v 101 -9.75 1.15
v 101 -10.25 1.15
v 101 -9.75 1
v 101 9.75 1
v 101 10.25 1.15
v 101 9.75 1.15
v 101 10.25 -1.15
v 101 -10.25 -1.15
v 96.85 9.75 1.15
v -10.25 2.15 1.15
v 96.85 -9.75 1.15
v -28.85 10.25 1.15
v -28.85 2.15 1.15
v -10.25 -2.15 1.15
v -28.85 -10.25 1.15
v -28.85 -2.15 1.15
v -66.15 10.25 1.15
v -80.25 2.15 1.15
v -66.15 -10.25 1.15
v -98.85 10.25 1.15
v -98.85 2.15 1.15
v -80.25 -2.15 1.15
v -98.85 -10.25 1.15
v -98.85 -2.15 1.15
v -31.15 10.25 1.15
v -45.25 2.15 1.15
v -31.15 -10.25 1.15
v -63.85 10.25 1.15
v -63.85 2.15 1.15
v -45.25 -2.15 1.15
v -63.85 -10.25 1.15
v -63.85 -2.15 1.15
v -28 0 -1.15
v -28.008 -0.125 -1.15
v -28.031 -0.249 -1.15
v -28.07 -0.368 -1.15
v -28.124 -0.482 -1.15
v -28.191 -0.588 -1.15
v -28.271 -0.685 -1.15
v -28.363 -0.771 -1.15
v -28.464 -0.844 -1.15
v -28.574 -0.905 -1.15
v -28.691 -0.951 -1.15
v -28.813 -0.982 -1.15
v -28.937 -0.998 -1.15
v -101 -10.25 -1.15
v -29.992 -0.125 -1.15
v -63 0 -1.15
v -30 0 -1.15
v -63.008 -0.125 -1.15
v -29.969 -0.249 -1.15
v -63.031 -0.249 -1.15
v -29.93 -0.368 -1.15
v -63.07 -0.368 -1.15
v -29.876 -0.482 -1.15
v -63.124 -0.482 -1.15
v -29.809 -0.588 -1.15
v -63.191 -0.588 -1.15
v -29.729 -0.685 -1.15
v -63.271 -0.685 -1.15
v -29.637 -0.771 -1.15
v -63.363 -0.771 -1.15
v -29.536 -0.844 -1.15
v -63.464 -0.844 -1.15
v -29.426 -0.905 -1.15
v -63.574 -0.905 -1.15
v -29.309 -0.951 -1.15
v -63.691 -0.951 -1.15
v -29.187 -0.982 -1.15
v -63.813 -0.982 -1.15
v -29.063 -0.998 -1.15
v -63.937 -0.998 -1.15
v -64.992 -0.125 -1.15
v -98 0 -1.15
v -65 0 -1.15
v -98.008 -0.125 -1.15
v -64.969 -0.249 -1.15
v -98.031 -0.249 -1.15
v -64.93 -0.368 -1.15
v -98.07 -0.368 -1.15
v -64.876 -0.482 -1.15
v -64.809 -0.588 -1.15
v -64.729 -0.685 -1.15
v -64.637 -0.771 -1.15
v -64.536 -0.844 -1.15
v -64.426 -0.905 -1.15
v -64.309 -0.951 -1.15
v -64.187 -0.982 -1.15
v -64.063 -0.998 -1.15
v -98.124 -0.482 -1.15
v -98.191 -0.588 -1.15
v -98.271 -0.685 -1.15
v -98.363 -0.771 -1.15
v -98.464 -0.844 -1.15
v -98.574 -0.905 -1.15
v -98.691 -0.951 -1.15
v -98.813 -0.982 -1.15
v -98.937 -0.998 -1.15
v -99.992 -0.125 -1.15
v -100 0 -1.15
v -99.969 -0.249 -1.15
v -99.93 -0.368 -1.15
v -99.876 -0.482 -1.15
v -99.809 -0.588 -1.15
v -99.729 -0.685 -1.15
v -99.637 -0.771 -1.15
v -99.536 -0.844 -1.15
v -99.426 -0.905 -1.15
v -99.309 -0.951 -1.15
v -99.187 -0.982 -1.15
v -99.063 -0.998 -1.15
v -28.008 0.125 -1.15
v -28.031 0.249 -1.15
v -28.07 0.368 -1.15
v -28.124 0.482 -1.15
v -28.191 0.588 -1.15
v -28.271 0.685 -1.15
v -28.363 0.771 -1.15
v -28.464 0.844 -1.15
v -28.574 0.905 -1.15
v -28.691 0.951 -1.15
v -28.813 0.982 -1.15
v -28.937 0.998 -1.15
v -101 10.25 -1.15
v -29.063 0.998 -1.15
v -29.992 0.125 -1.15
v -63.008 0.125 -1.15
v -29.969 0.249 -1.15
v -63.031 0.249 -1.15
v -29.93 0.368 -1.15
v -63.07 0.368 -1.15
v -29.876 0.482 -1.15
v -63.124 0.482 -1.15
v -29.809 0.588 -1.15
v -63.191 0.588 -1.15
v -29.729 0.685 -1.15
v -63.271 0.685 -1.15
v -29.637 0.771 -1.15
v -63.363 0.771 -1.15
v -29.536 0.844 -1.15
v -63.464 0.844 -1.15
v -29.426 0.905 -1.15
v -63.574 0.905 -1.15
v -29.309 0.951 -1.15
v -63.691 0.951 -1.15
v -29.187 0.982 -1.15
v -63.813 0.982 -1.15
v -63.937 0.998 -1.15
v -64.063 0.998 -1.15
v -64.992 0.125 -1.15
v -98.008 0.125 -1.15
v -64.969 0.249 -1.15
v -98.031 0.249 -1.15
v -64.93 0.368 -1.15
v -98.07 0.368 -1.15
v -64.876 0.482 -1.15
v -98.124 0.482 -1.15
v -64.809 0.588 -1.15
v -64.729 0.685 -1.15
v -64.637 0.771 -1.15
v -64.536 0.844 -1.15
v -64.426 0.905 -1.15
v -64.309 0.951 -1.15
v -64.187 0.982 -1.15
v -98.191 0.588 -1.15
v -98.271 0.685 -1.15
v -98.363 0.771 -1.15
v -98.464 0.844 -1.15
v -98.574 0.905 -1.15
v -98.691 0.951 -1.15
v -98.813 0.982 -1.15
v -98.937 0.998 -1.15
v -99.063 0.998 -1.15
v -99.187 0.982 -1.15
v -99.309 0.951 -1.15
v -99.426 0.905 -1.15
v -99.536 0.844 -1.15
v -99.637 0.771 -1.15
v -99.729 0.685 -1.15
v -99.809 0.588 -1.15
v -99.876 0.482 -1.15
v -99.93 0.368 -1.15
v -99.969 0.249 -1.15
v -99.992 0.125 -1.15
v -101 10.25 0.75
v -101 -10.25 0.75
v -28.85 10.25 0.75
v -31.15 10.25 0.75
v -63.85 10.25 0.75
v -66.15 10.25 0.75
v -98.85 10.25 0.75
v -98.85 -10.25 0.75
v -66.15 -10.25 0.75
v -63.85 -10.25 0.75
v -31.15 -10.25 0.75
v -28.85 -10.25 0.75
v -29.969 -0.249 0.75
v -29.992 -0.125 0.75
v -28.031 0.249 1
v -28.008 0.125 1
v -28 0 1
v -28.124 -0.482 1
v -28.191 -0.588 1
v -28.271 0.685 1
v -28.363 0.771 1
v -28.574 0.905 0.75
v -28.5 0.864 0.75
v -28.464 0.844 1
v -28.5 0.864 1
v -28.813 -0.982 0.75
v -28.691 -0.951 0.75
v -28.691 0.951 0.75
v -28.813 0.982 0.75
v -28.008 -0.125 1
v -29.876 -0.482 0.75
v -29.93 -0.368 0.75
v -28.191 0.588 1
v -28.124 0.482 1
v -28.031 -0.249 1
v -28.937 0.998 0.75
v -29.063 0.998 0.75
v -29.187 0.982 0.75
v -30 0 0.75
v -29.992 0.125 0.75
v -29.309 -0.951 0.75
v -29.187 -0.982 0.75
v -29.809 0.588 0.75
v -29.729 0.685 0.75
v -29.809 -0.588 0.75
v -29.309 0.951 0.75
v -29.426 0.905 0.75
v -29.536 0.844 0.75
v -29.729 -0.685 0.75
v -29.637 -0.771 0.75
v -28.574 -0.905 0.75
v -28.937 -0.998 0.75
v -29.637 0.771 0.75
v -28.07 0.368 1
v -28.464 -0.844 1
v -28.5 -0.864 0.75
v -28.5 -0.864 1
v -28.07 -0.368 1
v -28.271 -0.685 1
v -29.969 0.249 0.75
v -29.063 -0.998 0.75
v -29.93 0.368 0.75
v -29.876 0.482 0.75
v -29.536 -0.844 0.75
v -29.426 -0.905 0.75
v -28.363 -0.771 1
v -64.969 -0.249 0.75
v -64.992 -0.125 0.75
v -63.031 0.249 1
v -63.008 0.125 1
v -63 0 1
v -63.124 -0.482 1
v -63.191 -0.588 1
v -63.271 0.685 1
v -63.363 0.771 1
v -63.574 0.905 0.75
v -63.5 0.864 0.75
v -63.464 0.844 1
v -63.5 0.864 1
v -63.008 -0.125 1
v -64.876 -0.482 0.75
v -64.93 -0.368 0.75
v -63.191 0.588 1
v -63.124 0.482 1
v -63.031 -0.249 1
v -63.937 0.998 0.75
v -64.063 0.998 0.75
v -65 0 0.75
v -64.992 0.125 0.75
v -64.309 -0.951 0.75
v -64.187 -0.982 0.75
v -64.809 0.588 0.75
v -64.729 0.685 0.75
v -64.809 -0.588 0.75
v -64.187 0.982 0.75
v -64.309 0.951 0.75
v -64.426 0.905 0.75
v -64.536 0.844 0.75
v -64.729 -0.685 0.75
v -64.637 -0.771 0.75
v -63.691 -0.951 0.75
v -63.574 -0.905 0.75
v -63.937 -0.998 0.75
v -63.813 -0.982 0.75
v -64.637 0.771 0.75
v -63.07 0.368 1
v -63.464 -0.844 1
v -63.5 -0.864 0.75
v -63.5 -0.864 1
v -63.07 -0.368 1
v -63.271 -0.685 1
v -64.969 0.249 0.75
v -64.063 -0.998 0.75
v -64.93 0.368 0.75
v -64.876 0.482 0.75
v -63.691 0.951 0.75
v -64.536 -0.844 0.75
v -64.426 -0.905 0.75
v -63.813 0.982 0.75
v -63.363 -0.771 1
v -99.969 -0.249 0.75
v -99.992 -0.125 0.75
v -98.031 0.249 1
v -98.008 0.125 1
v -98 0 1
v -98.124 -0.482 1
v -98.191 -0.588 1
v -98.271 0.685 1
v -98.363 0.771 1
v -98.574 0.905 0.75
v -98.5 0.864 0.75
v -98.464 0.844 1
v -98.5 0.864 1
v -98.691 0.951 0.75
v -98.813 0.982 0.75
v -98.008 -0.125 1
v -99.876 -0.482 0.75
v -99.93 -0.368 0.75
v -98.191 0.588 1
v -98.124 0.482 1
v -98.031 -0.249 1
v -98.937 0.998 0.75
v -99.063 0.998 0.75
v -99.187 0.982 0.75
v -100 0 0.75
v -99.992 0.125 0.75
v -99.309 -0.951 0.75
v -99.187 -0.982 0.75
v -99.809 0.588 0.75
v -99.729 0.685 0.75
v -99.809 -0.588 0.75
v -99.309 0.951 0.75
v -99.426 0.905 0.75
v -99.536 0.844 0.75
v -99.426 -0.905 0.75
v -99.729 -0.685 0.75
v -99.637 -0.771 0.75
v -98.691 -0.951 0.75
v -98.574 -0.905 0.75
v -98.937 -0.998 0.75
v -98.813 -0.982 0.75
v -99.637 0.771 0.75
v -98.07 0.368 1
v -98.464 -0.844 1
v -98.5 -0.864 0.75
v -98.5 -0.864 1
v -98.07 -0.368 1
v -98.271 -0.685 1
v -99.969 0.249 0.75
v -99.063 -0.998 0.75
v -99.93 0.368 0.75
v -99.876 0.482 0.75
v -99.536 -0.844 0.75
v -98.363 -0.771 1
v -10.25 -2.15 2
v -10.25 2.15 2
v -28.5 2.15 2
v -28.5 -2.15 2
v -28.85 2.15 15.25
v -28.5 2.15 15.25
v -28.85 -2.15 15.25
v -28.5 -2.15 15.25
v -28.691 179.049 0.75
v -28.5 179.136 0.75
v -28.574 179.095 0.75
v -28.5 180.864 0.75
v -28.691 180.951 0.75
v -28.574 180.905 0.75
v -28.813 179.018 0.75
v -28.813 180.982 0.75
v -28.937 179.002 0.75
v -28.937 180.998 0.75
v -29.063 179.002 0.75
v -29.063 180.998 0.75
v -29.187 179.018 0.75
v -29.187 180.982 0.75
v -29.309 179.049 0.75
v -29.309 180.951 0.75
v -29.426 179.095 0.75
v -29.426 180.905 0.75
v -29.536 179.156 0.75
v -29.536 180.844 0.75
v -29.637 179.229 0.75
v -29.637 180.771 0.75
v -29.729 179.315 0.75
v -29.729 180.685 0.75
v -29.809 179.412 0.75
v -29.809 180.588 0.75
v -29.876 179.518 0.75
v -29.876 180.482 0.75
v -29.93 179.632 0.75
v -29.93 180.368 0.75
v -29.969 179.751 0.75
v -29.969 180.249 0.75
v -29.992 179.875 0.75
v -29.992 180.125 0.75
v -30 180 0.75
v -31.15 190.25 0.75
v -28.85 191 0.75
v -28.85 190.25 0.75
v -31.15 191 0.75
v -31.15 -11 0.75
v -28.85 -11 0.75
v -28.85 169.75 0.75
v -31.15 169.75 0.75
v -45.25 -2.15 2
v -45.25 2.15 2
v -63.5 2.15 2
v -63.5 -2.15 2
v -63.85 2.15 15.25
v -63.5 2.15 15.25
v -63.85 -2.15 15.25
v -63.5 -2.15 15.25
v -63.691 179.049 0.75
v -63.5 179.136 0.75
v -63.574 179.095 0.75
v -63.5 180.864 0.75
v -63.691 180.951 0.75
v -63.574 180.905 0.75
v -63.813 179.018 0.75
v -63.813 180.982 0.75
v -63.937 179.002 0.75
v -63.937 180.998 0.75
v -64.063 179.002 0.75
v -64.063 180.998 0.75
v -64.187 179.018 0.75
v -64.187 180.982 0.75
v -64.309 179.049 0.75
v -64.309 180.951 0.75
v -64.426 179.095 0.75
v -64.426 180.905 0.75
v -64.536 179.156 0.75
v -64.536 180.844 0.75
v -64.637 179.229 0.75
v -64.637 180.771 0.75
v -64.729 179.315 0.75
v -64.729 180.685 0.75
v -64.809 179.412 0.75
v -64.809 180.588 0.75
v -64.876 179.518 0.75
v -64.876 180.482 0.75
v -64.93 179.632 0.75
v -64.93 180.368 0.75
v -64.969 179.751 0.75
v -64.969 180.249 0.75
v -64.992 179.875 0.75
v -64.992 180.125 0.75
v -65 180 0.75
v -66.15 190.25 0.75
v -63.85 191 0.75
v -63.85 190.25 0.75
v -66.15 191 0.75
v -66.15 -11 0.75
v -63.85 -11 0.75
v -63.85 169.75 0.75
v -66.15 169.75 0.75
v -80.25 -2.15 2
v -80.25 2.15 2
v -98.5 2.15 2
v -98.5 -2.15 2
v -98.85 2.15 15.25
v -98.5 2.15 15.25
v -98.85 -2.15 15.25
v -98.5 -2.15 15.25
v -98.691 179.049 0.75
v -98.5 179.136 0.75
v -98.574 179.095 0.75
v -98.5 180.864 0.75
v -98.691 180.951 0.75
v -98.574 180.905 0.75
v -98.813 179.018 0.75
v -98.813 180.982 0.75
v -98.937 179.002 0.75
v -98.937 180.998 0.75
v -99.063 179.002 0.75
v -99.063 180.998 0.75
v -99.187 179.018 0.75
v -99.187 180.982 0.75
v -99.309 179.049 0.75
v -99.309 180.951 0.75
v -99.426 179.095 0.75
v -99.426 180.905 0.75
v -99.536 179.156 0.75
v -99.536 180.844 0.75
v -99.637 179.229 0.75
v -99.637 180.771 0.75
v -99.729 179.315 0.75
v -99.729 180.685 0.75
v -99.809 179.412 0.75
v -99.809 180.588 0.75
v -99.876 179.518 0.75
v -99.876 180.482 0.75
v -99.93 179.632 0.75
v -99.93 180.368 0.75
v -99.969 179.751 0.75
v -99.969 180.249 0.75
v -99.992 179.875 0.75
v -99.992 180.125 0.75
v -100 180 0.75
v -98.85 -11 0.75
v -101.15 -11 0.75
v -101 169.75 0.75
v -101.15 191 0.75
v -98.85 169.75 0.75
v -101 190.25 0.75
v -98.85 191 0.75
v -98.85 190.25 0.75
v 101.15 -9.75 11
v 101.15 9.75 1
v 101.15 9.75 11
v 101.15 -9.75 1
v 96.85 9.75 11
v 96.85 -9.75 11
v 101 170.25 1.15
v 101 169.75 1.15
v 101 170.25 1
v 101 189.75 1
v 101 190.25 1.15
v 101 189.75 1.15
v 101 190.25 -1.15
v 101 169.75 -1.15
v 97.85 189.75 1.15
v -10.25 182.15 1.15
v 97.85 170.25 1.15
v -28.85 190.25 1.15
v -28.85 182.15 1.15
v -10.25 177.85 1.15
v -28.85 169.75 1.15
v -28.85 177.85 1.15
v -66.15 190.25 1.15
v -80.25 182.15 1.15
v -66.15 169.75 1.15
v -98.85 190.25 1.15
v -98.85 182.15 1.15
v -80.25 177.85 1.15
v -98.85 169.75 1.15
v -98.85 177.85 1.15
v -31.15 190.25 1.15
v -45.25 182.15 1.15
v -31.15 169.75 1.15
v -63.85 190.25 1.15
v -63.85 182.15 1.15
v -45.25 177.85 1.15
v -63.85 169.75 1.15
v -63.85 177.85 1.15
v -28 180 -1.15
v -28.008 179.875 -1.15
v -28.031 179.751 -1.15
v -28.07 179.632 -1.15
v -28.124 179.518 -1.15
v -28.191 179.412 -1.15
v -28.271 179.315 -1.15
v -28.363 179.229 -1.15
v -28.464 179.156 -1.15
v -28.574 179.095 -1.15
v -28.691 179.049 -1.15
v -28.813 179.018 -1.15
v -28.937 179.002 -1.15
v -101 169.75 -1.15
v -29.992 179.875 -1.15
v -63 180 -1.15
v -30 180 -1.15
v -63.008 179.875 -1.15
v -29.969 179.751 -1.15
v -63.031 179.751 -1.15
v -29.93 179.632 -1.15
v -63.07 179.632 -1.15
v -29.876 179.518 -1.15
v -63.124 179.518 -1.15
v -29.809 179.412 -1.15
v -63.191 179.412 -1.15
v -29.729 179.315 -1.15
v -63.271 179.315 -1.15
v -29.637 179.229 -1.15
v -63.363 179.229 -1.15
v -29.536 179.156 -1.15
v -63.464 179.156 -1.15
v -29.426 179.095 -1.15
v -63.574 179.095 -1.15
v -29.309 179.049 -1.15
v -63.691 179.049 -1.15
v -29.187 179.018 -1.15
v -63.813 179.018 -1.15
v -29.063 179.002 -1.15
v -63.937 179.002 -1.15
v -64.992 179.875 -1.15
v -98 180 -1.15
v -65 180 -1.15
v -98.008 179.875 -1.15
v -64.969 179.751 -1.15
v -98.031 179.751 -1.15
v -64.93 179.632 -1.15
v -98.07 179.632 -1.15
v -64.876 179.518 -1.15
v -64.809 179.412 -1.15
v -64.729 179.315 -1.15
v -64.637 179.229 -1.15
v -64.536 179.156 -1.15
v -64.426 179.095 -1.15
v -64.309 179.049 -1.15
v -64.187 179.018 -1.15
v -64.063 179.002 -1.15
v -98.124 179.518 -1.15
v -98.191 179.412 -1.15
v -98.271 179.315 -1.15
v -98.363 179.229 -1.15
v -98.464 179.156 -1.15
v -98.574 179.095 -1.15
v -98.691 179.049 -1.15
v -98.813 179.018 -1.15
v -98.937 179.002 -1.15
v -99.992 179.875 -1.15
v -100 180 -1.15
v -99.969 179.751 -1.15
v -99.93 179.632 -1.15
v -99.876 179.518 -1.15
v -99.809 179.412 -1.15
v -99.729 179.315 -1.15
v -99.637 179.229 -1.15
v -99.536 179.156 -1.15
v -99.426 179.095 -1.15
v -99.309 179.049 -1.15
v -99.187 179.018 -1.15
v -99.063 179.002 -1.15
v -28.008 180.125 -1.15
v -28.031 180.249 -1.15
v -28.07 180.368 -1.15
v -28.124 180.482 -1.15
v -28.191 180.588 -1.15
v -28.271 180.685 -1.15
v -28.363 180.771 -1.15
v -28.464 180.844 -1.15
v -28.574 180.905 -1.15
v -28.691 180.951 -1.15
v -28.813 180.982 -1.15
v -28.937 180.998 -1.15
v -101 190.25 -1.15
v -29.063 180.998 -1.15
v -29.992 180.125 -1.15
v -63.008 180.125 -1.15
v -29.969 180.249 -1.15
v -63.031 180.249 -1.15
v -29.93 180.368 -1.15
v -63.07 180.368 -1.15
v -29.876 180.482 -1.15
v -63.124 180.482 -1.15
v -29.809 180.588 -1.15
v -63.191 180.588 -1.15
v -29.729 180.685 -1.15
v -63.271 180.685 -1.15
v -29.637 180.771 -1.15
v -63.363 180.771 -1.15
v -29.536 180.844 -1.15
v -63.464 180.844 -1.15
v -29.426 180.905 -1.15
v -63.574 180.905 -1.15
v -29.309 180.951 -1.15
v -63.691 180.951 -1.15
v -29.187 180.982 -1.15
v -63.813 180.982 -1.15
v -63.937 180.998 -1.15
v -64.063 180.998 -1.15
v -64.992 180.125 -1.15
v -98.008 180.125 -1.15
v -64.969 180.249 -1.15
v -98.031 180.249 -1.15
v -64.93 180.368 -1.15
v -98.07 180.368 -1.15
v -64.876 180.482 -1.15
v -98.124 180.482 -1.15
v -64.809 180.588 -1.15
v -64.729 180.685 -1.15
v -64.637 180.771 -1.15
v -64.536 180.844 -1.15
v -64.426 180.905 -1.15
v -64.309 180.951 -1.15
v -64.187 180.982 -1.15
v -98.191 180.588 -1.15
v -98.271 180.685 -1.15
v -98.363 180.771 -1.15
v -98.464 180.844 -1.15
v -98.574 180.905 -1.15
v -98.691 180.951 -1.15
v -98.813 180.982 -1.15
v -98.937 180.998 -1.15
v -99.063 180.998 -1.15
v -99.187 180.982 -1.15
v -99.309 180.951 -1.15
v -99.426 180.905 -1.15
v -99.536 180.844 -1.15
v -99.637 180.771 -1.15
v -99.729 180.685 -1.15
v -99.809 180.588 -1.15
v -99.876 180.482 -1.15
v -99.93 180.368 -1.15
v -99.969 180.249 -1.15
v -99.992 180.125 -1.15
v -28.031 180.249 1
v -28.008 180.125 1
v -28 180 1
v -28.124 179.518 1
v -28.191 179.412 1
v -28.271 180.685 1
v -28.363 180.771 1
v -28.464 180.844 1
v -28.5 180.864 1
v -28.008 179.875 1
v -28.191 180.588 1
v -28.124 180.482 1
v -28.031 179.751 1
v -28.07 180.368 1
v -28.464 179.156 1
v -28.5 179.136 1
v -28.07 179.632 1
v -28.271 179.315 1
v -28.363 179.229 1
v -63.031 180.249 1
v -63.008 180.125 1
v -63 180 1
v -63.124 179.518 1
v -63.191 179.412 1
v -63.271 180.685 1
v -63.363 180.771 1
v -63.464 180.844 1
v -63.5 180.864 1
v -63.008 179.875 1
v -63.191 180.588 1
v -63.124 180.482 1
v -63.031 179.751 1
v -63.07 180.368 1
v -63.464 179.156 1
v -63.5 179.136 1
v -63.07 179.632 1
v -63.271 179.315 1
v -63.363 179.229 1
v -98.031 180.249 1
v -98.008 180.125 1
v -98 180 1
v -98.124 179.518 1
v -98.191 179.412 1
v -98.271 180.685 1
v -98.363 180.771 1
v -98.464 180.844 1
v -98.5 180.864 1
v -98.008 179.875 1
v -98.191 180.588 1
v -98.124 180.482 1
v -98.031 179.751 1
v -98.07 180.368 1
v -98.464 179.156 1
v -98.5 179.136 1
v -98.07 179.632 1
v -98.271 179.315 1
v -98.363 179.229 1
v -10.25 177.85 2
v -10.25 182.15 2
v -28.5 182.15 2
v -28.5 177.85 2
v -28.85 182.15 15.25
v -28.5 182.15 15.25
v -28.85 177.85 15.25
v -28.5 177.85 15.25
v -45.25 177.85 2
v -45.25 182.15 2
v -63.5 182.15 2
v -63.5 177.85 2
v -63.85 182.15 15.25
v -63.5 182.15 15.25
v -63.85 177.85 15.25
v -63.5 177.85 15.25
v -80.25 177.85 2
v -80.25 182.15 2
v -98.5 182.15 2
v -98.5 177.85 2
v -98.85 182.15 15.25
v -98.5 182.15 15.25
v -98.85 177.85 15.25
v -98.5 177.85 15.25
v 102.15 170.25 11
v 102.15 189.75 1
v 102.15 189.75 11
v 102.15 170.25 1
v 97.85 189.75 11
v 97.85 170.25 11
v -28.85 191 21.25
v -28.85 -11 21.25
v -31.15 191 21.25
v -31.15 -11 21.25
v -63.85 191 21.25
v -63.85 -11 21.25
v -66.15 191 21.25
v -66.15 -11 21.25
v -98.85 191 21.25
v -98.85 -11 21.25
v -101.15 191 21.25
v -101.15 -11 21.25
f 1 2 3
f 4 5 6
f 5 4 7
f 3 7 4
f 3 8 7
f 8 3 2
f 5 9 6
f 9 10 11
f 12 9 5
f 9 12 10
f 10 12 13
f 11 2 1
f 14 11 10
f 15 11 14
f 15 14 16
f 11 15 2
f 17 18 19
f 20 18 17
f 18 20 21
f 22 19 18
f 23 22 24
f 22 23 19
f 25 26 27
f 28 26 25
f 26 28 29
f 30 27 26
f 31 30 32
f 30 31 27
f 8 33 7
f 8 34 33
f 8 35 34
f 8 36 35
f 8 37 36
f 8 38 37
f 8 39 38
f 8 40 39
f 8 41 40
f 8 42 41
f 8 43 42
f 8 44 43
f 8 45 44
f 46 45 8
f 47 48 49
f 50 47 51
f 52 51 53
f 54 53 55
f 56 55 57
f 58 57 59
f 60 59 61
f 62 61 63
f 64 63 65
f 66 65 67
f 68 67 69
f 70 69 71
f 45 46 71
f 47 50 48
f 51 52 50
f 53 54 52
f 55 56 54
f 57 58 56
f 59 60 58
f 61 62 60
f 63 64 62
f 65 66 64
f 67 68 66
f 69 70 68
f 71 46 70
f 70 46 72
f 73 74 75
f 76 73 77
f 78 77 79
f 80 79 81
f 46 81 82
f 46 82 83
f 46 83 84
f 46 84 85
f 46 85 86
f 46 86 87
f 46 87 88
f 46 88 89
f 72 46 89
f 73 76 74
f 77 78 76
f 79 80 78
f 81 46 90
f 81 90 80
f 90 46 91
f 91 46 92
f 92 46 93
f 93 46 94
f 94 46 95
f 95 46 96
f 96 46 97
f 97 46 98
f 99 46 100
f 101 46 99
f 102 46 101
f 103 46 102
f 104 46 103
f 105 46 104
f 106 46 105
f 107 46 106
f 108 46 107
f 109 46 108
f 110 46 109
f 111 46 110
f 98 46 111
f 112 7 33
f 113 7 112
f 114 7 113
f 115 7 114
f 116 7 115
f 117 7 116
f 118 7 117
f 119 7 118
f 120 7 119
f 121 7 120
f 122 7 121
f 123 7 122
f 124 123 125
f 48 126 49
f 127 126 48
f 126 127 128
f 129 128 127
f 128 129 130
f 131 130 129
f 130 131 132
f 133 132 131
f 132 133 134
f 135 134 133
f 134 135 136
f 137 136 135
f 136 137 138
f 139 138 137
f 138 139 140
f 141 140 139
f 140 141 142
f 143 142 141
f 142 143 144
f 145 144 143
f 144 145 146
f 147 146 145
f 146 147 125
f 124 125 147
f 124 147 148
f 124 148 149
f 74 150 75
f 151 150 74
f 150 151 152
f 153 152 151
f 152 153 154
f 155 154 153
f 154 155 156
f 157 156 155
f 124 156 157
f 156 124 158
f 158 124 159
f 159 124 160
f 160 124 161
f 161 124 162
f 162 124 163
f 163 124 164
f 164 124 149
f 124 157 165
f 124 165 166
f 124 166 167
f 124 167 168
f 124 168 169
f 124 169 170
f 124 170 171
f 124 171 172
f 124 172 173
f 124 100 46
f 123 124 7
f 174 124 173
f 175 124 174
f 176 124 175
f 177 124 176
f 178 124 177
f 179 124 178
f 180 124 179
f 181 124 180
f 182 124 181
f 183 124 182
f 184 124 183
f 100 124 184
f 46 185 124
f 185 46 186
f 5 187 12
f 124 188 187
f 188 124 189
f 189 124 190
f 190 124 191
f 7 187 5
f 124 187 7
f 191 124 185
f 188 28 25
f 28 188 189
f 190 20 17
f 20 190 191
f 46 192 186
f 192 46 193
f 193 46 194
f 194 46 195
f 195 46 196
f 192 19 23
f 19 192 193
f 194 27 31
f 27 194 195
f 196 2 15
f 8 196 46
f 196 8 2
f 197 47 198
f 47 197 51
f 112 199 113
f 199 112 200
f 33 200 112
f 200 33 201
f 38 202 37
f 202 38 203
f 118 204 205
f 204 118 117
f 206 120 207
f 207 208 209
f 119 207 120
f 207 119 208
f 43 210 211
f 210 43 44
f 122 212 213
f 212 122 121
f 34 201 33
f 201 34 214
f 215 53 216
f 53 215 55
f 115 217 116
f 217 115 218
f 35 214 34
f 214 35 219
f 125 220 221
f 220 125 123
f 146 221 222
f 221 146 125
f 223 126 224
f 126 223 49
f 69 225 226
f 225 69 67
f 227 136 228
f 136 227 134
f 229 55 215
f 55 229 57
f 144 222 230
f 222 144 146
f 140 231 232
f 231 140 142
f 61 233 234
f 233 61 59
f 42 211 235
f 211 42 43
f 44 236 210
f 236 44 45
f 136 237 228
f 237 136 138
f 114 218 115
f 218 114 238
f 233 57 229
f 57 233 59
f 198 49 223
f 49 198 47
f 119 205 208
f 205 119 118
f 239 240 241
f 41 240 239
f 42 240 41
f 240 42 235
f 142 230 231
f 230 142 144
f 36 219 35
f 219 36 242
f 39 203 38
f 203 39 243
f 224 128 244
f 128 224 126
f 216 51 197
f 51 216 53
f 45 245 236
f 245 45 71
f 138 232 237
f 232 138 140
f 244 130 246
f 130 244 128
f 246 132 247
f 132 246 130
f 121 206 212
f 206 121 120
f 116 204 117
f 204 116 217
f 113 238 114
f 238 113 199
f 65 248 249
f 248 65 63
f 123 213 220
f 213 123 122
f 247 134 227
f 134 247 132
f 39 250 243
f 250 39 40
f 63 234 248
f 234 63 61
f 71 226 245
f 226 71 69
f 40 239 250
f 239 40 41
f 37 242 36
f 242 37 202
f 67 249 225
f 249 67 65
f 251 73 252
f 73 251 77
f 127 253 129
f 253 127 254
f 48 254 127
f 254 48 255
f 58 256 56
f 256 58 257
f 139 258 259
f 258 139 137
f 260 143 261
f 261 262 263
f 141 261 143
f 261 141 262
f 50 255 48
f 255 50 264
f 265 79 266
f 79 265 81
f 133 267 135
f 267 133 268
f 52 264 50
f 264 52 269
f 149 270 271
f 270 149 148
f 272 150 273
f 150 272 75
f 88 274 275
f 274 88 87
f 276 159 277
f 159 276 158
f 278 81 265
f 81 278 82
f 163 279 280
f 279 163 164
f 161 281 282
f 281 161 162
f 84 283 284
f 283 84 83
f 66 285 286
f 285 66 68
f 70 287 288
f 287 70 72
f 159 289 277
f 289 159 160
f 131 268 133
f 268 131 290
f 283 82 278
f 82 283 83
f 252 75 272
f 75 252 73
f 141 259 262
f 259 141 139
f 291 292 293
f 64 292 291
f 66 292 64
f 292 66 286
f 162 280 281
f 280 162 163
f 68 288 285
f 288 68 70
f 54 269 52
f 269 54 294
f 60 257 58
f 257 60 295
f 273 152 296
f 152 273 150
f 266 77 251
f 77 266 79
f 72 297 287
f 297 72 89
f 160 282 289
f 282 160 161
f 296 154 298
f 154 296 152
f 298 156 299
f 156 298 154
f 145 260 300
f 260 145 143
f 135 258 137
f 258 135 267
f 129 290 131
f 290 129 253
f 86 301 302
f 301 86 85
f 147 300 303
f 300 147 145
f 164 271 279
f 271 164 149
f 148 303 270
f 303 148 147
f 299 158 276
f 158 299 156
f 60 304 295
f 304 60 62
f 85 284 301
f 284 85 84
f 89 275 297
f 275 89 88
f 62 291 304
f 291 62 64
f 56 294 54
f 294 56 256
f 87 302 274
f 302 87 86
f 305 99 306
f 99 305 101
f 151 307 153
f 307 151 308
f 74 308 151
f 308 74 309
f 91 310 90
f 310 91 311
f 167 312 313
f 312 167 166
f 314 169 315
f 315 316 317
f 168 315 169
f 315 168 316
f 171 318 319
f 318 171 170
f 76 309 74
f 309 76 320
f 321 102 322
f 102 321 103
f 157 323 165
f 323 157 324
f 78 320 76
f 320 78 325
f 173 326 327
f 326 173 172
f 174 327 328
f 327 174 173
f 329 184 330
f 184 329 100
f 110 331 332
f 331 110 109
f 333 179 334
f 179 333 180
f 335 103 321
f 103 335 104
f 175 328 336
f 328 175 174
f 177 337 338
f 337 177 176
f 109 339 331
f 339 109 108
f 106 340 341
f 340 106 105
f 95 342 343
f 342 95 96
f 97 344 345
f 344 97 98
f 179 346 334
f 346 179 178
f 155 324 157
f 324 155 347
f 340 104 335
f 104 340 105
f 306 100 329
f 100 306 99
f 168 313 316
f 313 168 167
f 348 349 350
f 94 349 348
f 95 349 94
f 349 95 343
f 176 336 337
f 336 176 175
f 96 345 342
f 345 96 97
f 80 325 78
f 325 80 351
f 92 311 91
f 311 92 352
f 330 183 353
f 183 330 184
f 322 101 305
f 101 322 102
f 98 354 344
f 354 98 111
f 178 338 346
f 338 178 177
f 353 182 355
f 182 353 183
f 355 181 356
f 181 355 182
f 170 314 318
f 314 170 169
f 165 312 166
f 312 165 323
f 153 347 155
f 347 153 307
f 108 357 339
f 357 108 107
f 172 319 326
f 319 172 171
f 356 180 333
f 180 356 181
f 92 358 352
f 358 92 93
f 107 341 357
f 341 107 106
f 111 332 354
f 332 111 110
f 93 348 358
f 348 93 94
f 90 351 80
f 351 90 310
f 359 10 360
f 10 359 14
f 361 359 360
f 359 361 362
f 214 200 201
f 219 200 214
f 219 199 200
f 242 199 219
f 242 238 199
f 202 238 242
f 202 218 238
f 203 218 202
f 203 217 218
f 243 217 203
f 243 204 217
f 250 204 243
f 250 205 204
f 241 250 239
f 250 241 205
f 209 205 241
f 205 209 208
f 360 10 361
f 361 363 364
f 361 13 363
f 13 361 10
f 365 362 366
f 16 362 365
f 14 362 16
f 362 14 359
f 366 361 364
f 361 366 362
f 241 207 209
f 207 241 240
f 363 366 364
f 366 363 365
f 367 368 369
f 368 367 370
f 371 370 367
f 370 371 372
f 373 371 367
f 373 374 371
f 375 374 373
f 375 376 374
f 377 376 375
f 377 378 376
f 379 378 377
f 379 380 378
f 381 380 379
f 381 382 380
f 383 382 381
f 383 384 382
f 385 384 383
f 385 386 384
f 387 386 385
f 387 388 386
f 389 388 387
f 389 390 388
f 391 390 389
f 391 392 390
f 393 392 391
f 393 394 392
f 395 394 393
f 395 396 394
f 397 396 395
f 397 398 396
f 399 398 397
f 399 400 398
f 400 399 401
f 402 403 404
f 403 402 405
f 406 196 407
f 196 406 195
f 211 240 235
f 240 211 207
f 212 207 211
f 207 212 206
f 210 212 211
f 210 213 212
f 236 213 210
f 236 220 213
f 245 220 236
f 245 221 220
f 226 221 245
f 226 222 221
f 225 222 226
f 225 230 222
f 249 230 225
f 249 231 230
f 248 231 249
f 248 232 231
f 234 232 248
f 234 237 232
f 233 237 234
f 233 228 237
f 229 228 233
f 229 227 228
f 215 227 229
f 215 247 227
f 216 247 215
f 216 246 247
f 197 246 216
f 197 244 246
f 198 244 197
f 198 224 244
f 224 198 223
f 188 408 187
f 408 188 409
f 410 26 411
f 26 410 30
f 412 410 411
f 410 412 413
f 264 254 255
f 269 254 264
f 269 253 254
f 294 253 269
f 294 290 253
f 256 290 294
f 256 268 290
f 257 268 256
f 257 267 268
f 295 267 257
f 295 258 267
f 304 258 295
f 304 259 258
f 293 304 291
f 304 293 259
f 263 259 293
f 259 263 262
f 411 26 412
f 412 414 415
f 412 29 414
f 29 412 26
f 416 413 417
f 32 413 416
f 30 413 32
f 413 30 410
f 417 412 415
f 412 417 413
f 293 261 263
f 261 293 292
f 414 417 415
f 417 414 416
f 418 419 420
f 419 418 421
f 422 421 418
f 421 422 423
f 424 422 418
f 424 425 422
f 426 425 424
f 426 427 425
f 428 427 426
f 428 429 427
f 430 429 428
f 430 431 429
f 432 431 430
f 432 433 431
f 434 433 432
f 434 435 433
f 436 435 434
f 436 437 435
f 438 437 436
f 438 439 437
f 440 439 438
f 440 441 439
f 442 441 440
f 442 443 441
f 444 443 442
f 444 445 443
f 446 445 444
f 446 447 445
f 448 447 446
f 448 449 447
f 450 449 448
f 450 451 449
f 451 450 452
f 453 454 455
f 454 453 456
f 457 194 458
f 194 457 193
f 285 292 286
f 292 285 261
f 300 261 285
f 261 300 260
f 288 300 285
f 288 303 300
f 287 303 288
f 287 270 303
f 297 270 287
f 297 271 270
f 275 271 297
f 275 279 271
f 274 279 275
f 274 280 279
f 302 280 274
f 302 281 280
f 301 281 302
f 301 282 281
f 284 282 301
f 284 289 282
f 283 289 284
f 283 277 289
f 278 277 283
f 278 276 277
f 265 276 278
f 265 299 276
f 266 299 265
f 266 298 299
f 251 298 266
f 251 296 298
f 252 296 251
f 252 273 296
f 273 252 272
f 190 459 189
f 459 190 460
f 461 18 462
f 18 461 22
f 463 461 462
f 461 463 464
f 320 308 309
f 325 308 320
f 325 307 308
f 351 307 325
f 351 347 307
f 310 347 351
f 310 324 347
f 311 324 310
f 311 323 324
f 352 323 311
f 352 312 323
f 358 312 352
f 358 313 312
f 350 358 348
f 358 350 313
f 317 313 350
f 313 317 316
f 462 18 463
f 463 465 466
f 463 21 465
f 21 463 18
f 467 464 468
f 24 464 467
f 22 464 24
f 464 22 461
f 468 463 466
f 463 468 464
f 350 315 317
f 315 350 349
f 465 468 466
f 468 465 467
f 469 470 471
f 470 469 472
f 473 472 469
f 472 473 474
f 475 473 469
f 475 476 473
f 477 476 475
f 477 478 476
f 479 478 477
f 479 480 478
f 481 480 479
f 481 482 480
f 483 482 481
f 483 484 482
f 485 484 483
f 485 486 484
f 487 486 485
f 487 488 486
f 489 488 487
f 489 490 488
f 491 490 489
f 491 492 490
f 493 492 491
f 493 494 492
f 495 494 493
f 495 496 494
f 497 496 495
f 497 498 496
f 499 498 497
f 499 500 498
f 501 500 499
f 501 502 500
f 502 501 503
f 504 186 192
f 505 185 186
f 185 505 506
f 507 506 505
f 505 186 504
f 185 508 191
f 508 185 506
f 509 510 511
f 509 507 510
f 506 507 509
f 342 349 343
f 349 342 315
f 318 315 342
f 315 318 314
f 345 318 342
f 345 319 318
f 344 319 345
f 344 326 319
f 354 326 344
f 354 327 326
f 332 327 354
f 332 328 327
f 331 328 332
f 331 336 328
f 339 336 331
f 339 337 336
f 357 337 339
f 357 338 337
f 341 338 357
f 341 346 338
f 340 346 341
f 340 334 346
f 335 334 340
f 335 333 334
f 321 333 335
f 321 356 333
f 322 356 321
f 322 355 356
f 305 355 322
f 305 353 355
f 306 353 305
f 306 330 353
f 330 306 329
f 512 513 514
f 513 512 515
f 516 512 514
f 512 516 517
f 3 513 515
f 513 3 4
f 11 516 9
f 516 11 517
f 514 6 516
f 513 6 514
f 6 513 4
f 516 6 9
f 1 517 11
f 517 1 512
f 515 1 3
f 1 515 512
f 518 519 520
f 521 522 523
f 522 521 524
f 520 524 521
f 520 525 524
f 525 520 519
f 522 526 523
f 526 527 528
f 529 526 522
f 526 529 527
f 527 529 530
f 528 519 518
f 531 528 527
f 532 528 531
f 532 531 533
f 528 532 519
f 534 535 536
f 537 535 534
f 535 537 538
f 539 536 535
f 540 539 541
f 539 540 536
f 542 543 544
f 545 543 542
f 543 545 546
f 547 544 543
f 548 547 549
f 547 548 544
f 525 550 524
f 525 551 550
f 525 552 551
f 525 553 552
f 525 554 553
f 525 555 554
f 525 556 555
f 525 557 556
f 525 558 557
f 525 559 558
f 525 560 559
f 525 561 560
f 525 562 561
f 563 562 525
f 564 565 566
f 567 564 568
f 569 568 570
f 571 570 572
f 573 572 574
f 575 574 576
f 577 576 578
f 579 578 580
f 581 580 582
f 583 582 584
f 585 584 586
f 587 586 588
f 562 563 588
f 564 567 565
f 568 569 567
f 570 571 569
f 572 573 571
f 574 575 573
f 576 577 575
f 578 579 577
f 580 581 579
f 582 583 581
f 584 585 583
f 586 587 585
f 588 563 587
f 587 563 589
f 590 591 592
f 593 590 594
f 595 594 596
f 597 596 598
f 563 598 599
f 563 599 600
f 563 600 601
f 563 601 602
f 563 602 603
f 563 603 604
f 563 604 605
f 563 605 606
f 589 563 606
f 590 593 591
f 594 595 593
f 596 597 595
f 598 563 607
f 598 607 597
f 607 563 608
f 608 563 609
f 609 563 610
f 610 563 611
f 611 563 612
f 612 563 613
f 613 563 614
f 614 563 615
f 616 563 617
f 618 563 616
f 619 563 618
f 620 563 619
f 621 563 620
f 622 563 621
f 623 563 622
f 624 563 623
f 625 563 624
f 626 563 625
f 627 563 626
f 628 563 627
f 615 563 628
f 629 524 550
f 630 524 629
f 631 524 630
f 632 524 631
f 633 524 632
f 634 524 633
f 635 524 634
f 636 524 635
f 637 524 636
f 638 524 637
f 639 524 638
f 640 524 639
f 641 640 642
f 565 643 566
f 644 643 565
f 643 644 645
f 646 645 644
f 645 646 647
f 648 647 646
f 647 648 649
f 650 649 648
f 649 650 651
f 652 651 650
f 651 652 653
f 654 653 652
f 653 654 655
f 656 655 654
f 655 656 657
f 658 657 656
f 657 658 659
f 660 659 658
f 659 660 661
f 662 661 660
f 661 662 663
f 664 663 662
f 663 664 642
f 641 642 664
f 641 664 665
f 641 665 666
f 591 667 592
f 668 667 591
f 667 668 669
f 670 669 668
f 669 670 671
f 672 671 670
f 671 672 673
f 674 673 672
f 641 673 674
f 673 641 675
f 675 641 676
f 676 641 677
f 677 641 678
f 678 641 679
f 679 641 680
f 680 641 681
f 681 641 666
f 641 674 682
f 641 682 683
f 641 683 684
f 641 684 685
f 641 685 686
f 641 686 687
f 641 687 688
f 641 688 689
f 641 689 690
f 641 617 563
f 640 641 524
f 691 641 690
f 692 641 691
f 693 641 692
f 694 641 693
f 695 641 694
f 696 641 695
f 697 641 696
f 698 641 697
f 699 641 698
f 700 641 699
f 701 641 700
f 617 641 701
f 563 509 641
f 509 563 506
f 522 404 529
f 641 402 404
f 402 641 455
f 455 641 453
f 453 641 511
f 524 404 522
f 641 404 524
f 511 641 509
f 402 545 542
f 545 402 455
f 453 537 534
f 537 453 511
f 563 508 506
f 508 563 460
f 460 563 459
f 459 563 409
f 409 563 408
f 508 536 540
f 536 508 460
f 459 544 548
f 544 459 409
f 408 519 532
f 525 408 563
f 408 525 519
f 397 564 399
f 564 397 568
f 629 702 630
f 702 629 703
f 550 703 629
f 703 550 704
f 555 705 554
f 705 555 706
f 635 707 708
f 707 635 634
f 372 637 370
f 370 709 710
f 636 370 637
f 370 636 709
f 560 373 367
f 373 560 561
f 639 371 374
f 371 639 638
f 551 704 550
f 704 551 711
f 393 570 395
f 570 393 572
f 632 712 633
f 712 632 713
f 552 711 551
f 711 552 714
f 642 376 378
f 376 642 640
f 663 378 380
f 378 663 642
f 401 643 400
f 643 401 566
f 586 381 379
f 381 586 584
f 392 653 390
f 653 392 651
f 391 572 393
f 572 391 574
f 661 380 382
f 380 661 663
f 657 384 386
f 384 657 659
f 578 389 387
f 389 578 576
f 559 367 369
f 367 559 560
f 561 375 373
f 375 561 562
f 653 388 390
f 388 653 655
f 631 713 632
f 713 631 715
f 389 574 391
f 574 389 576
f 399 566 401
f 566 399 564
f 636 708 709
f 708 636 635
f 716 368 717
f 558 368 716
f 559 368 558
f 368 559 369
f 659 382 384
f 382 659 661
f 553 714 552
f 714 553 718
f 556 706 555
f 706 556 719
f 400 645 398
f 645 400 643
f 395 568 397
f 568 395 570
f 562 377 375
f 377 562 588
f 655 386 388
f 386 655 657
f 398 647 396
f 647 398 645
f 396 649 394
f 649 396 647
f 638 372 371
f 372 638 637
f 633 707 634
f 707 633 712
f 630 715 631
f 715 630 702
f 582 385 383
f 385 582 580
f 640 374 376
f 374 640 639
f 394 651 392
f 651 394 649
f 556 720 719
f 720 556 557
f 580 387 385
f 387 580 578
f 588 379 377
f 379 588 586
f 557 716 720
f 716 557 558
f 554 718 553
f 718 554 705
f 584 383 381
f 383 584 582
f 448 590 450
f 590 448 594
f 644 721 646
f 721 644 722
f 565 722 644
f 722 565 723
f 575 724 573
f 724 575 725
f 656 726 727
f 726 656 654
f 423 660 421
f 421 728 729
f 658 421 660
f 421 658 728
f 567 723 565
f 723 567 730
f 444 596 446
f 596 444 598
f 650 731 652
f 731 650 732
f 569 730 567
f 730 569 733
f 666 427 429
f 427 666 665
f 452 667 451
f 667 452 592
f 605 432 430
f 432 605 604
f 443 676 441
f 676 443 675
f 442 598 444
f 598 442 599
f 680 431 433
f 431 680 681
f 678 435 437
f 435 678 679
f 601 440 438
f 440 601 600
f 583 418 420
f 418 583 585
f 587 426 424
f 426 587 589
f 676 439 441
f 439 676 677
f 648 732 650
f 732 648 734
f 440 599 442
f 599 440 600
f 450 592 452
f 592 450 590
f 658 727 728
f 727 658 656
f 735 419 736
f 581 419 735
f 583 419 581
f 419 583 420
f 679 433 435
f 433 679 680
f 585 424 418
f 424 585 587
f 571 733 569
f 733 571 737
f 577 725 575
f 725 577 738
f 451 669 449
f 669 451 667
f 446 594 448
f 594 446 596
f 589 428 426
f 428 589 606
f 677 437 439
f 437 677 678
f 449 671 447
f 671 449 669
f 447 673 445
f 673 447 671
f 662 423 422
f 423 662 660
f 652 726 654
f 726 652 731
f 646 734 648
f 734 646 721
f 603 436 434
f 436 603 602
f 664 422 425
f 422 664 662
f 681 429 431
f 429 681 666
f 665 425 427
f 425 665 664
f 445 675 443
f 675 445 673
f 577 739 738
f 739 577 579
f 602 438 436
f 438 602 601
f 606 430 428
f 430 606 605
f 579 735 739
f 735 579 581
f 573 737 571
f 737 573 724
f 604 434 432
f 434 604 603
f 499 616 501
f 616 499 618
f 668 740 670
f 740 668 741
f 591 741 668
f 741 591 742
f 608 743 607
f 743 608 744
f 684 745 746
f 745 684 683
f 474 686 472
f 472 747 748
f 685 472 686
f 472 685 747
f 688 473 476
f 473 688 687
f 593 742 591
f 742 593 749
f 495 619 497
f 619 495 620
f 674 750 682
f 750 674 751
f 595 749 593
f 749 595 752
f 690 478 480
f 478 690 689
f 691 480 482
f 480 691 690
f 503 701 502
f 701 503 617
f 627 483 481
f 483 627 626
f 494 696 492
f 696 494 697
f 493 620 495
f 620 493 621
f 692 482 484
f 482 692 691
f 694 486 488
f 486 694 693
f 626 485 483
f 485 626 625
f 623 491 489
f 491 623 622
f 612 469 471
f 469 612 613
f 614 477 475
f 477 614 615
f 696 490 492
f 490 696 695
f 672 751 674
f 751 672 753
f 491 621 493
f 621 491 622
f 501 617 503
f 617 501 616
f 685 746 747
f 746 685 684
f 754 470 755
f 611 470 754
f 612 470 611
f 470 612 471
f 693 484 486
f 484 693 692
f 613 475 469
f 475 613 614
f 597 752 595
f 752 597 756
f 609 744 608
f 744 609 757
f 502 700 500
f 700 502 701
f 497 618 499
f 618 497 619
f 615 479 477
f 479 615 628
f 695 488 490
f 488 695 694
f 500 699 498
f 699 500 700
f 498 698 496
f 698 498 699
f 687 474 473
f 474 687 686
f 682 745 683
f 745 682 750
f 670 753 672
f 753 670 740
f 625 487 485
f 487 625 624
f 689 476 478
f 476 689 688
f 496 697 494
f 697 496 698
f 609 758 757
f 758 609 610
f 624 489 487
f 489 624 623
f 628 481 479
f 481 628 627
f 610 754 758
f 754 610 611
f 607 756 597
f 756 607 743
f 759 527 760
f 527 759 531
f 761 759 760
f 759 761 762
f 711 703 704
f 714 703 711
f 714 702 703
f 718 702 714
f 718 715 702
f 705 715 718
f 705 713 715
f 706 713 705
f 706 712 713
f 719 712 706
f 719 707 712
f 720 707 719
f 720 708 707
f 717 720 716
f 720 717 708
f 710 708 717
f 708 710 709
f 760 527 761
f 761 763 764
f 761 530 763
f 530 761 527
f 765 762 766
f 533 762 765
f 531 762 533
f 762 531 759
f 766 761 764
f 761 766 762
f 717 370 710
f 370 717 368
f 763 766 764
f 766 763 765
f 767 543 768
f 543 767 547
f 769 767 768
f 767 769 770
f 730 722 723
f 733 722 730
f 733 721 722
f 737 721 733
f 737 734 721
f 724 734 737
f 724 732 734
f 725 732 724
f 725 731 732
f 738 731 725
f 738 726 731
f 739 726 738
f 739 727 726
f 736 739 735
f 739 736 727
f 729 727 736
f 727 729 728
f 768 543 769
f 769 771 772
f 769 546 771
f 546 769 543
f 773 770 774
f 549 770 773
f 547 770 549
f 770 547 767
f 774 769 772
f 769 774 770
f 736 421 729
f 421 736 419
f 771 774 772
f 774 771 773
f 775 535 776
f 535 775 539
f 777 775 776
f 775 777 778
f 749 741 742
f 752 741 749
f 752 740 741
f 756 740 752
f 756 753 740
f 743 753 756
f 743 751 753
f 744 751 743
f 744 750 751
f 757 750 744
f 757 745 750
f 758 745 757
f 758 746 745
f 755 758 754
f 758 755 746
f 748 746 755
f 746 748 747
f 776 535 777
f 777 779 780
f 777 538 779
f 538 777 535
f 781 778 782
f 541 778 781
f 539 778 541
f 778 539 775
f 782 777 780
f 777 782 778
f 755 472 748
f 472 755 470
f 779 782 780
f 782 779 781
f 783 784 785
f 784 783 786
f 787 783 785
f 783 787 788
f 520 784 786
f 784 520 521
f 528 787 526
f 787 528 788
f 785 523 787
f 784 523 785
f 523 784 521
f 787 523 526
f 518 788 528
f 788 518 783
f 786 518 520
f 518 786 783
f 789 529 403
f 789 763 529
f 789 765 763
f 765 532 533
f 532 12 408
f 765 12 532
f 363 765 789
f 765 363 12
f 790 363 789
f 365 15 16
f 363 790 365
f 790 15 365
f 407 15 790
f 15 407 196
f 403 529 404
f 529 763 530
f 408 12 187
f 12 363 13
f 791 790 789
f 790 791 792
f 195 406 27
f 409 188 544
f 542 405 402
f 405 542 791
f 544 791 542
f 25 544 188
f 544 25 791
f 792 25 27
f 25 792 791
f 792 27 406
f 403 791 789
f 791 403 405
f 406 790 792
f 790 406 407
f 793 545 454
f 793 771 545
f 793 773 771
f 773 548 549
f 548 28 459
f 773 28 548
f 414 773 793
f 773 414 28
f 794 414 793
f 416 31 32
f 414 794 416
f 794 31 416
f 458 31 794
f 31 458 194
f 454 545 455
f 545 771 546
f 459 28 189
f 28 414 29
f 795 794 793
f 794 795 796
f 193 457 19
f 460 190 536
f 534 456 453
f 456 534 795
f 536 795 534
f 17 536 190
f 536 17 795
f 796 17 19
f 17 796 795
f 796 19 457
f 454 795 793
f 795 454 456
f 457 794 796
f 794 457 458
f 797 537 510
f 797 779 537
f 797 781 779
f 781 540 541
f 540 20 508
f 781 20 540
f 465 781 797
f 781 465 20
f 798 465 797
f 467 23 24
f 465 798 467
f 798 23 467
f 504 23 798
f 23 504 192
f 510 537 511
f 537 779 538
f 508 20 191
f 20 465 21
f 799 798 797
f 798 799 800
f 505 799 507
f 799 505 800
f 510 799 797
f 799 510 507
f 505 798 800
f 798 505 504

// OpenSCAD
// Outil pour les éléments de l'établi (ex: trou, vis, ...)
module trou(h=3, d=1)
{
    $fn = 50;
    cylinder(h, d, center=true);
}


// Eléments de l'établi
module equerre(x=0,y=0,z=0){
    
    translate([x,y,z]){
        color("red",0.9){
            // plaque verticale
            translate([-20, 0, 1.5]){
                $planche_L = 19.5;
                $planche_l = 4.3;
                $planche_h = 1;
                cube([$planche_L, $planche_l, $planche_h], center = true);
            }
            
            // plaque profondeur
            translate([-29, 0, 8]){
                $planche_L = 14.5;
                $planche_l = 4.3;
                $planche_h = 1;
                cube([$planche_h, $planche_l, $planche_L], center = true);
            }
        }
    }
}


module pied(x=119,y=0,z=0){
    
    translate([x,y,z]){
        color("blue",0.9){
            // plaque verticale
            translate([-20, 0, 6]){
                $planche_L = 19.5;
                $planche_l = 4.3;
                $planche_h = 10;
                cube([$planche_l, $planche_L, $planche_h], center = true);
            }
        }
    }
}

module planche_verticale_gauche(x=0, y=0, z=0)
{
    color("black",0.6){
        $planche_L = 202;
        $planche_l = 20.5;
        $planche_h = 2.3;
        translate([x,y,z]){
            // trou
            difference(){
                cube([$planche_L, $planche_l, $planche_h], center = true);
                
                // première planche à 130 cm
                $hauteur_trou_1 = ($planche_L/2) - 130;
                translate([$hauteur_trou_1,0,0]){
                    trou();
                }
               
                // deuxième planche à 165 cm
               $hauteur_trou_2 = ($planche_L/2) - 165;
               translate([$hauteur_trou_2,0,0]){
                    trou();
               }
                
                // troisième planche à 200 cm
               $hauteur_trou_3 = ($planche_L/2) - 200;
               translate([$hauteur_trou_3,0,0]){
                    trou();
               }   
            }
        }
    }
    
    // equerres
    equerre(0,0,0);
    equerre(-35,0,0);
    equerre(-70,0,0);
    
    // Pied
    pied();
}

module planche_verticale_droite(x=0, y=180, z=0)
{
    color("black",0.6){
        $planche_L = 202;
        $planche_l = 20.5;
        $planche_h = 2.3;
        translate([x,y,z]){
            difference(){
                cube([$planche_L, $planche_l, $planche_h], center = true);
                
                // première planche à 130 cm
                $hauteur_trou = ($planche_L/2);
                
                translate([$hauteur_trou - 130,0,0]){
                    trou();
                }  
               
                // deuxième planche à 165 cm
               translate([$hauteur_trou - 165,0,0]){
                    trou();
               }
                
                // troisième planche à 200 cm
               translate([$hauteur_trou - 200,0,0]){
                    trou();
               }   
            }
        }
    }
    // equerres
    equerre(0,180,0);
    equerre(-35,180,0);
    equerre(-70,180,0);
    
    // Pied
    pied(120,180,0);
}

module planche_horizontale_premiere(x=-30, y=90, z=11)
{
    color("brown",0.5){
        $planche_L = 202;
        $planche_l = 20.5;
        $planche_h = 2.3;
        translate([x,y,z]){
            difference(){
                cube([$planche_h, $planche_L, $planche_l], center = true);
                
                // première planche à 130 cm
                $hauteur_trou = ($planche_L/2);
                
                translate([$hauteur_trou - 130,0,0]){
                    trou();
                }  
               
                // deuxième planche à 165 cm
               translate([$hauteur_trou - 165,0,0]){
                    trou();
               }
                
                // troisième planche à 200 cm
               translate([$hauteur_trou - 200,0,0]){
                    trou();
               }   
            }
        }
    }
}

module planche_horizontale_deuxieme(x=-65, y=90, z=11)
{
    color("brown",0.5){
        $planche_L = 202;
        $planche_l = 20.5;
        $planche_h = 2.3;
        translate([x,y,z]){
            difference(){
                cube([$planche_h, $planche_L, $planche_l], center = true);
                
                // première planche à 130 cm
                $hauteur_trou = ($planche_L/2);
                
                translate([$hauteur_trou - 130,0,0]){
                    trou();
                }  
               
                // deuxième planche à 165 cm
               translate([$hauteur_trou - 165,0,0]){
                    trou();
               }
                
                // troisième planche à 200 cm
               translate([$hauteur_trou - 200,0,0]){
                    trou();
               }   
            }
        }
    }
}

module planche_horizontale_troisieme(x=-100, y=90, z=11)
{
    color("brown",0.5){
        $planche_L = 202;
        $planche_l = 20.5;
        $planche_h = 2.3;
        translate([x,y,z]){
            difference(){
                cube([$planche_h, $planche_L, $planche_l], center = true);
                
                // première planche à 130 cm
                $hauteur_trou = ($planche_L/2);
                
                translate([$hauteur_trou - 130,0,0]){
                    trou();
                }  
               
                // deuxième planche à 165 cm
               translate([$hauteur_trou - 165,0,0]){
                    trou();
               }
                
                // troisième planche à 200 cm
               translate([$hauteur_trou - 200,0,0]){
                    trou();
               }   
            }
        }
    }
}






//Affichage éléments
planche_verticale_gauche();
planche_verticale_droite();
planche_horizontale_premiere();
planche_horizontale_deuxieme();
planche_horizontale_troisieme();
